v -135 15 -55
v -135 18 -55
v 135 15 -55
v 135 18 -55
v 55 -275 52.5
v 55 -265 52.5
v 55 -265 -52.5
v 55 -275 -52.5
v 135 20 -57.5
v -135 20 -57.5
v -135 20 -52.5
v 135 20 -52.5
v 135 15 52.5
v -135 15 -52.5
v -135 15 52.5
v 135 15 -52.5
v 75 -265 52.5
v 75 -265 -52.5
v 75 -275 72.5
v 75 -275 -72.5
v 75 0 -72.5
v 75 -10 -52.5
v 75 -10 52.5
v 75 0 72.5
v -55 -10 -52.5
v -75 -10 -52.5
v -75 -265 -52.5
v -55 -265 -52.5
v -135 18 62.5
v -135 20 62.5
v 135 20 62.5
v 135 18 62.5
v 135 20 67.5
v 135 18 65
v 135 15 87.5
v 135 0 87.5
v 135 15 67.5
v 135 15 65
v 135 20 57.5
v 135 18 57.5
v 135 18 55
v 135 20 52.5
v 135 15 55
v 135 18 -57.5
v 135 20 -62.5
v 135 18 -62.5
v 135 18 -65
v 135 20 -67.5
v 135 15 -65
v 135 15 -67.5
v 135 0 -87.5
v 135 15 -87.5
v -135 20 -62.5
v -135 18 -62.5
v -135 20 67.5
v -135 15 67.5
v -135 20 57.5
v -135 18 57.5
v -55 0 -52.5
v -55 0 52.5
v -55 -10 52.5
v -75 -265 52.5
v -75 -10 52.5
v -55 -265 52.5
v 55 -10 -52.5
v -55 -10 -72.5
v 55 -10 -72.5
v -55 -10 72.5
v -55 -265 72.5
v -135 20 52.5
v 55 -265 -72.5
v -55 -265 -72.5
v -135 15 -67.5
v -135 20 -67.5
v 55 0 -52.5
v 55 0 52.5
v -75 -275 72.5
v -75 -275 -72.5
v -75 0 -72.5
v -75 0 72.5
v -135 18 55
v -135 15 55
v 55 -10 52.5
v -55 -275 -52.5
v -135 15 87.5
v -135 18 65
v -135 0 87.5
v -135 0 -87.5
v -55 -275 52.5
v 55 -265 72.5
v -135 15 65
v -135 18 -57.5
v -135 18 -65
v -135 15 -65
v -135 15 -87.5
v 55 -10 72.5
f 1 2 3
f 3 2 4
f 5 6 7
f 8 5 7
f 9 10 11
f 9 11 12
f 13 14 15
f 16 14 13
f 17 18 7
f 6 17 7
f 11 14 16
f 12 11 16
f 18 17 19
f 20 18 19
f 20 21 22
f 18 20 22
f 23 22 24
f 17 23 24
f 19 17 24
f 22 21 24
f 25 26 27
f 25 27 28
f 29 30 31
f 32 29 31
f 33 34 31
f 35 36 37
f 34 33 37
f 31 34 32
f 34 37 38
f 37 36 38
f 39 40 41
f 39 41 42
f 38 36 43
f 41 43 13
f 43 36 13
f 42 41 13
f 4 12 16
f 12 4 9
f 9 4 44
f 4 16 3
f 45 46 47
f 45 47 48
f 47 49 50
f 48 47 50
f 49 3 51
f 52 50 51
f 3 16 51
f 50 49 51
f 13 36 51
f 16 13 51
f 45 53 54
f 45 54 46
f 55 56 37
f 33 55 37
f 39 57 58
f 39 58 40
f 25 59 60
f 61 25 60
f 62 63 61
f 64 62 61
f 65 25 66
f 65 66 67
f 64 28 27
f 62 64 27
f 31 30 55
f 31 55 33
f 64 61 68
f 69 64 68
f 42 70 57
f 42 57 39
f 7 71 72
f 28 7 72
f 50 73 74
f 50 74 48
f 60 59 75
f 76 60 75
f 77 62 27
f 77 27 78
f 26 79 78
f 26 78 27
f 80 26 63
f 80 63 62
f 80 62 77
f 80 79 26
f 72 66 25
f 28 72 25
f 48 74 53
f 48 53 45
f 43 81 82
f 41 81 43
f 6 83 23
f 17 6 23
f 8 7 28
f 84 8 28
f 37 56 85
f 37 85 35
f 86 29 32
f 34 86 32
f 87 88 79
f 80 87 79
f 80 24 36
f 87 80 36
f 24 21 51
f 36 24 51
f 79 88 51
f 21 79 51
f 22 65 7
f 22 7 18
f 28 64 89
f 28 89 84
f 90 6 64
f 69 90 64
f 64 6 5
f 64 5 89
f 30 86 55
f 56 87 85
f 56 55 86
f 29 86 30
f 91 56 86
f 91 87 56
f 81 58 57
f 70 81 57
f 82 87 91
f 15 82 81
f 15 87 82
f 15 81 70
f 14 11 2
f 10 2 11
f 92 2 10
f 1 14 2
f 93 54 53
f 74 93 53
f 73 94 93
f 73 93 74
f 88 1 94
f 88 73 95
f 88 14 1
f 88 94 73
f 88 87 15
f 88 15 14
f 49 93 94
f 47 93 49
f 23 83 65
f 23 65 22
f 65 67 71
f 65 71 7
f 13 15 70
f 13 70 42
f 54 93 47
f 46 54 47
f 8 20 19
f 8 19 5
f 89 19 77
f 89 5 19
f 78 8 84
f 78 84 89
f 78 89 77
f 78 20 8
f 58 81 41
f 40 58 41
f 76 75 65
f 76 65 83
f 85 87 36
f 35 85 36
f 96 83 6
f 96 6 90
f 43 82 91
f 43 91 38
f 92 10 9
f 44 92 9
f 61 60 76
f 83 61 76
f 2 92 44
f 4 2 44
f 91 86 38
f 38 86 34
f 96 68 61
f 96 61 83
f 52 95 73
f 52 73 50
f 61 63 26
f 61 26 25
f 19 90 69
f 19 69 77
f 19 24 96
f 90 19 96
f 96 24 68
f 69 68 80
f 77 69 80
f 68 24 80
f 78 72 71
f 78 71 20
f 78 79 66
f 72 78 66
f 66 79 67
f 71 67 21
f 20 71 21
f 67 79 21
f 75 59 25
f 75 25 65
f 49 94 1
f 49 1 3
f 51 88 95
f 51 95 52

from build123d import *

# Parameters (mm, degrees)
SKETCH_1_W          = 270
SKETCH_1_H          = 175
EXTRUDE_1_DEPTH     = 15
SKETCH_2_W          = 20
SKETCH_2_H          = 20
EXTRUDE_5_DEPTH     = 275
SKETCH_5_W          = 110
SKETCH_5_H          = 20
SKETCH_5_W_2        = 20
SKETCH_5_H_2        = 105
EXTRUDE_6_DEPTH     = 10
SKETCH_6_W          = 110
SKETCH_6_H          = 20
SKETCH_6_W_2        = 20
SKETCH_6_H_2        = 105
EXTRUDE_7_DEPTH     = 10
SKETCH_7_W          = 270
SKETCH_7_H          = 15
EXTRUDE_8_DEPTH     = 5
SKETCH_8_W          = 270
SKETCH_8_H          = 5
CUT_EXTRUDE_1_DEPTH = 2
SKETCH_10_W         = 270
SKETCH_10_H         = 10
CUT_EXTRUDE_2_DEPTH = 3


with BuildPart() as part:
    # Sketch 1 → Extrude 1 (new body)
    with BuildSketch(Plane(origin=(0, 0, 0), x_dir=(1, 0, 0), z_dir=(0, 1, 0))):
        Rectangle(SKETCH_1_W, SKETCH_1_H)
    extrude(amount=EXTRUDE_1_DEPTH)

    # Sketch 2 → Extrude 5 (add)
    with BuildSketch(Plane.XZ):
        with Locations((65, -62.5)):
            Rectangle(SKETCH_2_W, SKETCH_2_H)
        with Locations((65, 62.5)):
            Rectangle(SKETCH_2_W, SKETCH_2_H)
        with Locations((-65, 62.5)):
            Rectangle(SKETCH_2_W, SKETCH_2_H)
        with Locations((-65, -62.5)):
            Rectangle(SKETCH_2_W, SKETCH_2_H)
    extrude(amount=EXTRUDE_5_DEPTH)

    # Sketch 5 → Extrude 6 (add)
    with BuildSketch(Plane.XZ):
        with Locations((0, 62.5)):
            Rectangle(SKETCH_5_W, SKETCH_5_H)
        with Locations((-65, 0)):
            Rectangle(SKETCH_5_W_2, SKETCH_5_H_2)
        with Locations((0, -62.5)):
            Rectangle(SKETCH_5_W, SKETCH_5_H)
        with Locations((65, 0)):
            Rectangle(SKETCH_5_W_2, SKETCH_5_H_2)
    extrude(amount=EXTRUDE_6_DEPTH)

    # Sketch 6 → Extrude 7 (add)
    with BuildSketch(Plane(origin=(0, -265, 0), x_dir=(-1, 0, 0), z_dir=(0, -1, 0))):
        with Locations((0, -62.5)):
            Rectangle(SKETCH_6_W, SKETCH_6_H)
        with Locations((65, 0)):
            Rectangle(SKETCH_6_W_2, SKETCH_6_H_2)
        with Locations((0, 62.5)):
            Rectangle(SKETCH_6_W, SKETCH_6_H)
        with Locations((-65, 0)):
            Rectangle(SKETCH_6_W_2, SKETCH_6_H_2)
    extrude(amount=EXTRUDE_7_DEPTH)

    # Sketch 7 → Extrude 8 (add)
    with BuildSketch(Plane(origin=(0, 15, 0), x_dir=(1, 0, 0), z_dir=(0, 1, 0))):
        with Locations((0, 60)):
            Rectangle(SKETCH_7_W, SKETCH_7_H)
        with Locations((0, -60)):
            Rectangle(SKETCH_7_W, SKETCH_7_H)
    extrude(amount=EXTRUDE_8_DEPTH)

    # Sketch 8 → Cut-Extrude 1 (cut)
    with BuildSketch(Plane(origin=(0, 20, 0), x_dir=(1, 0, 0), z_dir=(0, 1, 0))):
        with Locations((0, -60)):
            Rectangle(SKETCH_8_W, SKETCH_8_H)
        with Locations((0, 60)):
            Rectangle(SKETCH_8_W, SKETCH_8_H)
    extrude(amount=-CUT_EXTRUDE_1_DEPTH, mode=Mode.SUBTRACT)

    # Sketch 10 → Cut-Extrude 2 (cut)
    with BuildSketch(Plane(origin=(0, 18, 0), x_dir=(1, 0, 0), z_dir=(0, 1, 0))):
        with Locations((0, -60)):
            Rectangle(SKETCH_10_W, SKETCH_10_H)
        with Locations((0, 60)):
            Rectangle(SKETCH_10_W, SKETCH_10_H)
    extrude(amount=-CUT_EXTRUDE_2_DEPTH, mode=Mode.SUBTRACT)


solid = part.part
